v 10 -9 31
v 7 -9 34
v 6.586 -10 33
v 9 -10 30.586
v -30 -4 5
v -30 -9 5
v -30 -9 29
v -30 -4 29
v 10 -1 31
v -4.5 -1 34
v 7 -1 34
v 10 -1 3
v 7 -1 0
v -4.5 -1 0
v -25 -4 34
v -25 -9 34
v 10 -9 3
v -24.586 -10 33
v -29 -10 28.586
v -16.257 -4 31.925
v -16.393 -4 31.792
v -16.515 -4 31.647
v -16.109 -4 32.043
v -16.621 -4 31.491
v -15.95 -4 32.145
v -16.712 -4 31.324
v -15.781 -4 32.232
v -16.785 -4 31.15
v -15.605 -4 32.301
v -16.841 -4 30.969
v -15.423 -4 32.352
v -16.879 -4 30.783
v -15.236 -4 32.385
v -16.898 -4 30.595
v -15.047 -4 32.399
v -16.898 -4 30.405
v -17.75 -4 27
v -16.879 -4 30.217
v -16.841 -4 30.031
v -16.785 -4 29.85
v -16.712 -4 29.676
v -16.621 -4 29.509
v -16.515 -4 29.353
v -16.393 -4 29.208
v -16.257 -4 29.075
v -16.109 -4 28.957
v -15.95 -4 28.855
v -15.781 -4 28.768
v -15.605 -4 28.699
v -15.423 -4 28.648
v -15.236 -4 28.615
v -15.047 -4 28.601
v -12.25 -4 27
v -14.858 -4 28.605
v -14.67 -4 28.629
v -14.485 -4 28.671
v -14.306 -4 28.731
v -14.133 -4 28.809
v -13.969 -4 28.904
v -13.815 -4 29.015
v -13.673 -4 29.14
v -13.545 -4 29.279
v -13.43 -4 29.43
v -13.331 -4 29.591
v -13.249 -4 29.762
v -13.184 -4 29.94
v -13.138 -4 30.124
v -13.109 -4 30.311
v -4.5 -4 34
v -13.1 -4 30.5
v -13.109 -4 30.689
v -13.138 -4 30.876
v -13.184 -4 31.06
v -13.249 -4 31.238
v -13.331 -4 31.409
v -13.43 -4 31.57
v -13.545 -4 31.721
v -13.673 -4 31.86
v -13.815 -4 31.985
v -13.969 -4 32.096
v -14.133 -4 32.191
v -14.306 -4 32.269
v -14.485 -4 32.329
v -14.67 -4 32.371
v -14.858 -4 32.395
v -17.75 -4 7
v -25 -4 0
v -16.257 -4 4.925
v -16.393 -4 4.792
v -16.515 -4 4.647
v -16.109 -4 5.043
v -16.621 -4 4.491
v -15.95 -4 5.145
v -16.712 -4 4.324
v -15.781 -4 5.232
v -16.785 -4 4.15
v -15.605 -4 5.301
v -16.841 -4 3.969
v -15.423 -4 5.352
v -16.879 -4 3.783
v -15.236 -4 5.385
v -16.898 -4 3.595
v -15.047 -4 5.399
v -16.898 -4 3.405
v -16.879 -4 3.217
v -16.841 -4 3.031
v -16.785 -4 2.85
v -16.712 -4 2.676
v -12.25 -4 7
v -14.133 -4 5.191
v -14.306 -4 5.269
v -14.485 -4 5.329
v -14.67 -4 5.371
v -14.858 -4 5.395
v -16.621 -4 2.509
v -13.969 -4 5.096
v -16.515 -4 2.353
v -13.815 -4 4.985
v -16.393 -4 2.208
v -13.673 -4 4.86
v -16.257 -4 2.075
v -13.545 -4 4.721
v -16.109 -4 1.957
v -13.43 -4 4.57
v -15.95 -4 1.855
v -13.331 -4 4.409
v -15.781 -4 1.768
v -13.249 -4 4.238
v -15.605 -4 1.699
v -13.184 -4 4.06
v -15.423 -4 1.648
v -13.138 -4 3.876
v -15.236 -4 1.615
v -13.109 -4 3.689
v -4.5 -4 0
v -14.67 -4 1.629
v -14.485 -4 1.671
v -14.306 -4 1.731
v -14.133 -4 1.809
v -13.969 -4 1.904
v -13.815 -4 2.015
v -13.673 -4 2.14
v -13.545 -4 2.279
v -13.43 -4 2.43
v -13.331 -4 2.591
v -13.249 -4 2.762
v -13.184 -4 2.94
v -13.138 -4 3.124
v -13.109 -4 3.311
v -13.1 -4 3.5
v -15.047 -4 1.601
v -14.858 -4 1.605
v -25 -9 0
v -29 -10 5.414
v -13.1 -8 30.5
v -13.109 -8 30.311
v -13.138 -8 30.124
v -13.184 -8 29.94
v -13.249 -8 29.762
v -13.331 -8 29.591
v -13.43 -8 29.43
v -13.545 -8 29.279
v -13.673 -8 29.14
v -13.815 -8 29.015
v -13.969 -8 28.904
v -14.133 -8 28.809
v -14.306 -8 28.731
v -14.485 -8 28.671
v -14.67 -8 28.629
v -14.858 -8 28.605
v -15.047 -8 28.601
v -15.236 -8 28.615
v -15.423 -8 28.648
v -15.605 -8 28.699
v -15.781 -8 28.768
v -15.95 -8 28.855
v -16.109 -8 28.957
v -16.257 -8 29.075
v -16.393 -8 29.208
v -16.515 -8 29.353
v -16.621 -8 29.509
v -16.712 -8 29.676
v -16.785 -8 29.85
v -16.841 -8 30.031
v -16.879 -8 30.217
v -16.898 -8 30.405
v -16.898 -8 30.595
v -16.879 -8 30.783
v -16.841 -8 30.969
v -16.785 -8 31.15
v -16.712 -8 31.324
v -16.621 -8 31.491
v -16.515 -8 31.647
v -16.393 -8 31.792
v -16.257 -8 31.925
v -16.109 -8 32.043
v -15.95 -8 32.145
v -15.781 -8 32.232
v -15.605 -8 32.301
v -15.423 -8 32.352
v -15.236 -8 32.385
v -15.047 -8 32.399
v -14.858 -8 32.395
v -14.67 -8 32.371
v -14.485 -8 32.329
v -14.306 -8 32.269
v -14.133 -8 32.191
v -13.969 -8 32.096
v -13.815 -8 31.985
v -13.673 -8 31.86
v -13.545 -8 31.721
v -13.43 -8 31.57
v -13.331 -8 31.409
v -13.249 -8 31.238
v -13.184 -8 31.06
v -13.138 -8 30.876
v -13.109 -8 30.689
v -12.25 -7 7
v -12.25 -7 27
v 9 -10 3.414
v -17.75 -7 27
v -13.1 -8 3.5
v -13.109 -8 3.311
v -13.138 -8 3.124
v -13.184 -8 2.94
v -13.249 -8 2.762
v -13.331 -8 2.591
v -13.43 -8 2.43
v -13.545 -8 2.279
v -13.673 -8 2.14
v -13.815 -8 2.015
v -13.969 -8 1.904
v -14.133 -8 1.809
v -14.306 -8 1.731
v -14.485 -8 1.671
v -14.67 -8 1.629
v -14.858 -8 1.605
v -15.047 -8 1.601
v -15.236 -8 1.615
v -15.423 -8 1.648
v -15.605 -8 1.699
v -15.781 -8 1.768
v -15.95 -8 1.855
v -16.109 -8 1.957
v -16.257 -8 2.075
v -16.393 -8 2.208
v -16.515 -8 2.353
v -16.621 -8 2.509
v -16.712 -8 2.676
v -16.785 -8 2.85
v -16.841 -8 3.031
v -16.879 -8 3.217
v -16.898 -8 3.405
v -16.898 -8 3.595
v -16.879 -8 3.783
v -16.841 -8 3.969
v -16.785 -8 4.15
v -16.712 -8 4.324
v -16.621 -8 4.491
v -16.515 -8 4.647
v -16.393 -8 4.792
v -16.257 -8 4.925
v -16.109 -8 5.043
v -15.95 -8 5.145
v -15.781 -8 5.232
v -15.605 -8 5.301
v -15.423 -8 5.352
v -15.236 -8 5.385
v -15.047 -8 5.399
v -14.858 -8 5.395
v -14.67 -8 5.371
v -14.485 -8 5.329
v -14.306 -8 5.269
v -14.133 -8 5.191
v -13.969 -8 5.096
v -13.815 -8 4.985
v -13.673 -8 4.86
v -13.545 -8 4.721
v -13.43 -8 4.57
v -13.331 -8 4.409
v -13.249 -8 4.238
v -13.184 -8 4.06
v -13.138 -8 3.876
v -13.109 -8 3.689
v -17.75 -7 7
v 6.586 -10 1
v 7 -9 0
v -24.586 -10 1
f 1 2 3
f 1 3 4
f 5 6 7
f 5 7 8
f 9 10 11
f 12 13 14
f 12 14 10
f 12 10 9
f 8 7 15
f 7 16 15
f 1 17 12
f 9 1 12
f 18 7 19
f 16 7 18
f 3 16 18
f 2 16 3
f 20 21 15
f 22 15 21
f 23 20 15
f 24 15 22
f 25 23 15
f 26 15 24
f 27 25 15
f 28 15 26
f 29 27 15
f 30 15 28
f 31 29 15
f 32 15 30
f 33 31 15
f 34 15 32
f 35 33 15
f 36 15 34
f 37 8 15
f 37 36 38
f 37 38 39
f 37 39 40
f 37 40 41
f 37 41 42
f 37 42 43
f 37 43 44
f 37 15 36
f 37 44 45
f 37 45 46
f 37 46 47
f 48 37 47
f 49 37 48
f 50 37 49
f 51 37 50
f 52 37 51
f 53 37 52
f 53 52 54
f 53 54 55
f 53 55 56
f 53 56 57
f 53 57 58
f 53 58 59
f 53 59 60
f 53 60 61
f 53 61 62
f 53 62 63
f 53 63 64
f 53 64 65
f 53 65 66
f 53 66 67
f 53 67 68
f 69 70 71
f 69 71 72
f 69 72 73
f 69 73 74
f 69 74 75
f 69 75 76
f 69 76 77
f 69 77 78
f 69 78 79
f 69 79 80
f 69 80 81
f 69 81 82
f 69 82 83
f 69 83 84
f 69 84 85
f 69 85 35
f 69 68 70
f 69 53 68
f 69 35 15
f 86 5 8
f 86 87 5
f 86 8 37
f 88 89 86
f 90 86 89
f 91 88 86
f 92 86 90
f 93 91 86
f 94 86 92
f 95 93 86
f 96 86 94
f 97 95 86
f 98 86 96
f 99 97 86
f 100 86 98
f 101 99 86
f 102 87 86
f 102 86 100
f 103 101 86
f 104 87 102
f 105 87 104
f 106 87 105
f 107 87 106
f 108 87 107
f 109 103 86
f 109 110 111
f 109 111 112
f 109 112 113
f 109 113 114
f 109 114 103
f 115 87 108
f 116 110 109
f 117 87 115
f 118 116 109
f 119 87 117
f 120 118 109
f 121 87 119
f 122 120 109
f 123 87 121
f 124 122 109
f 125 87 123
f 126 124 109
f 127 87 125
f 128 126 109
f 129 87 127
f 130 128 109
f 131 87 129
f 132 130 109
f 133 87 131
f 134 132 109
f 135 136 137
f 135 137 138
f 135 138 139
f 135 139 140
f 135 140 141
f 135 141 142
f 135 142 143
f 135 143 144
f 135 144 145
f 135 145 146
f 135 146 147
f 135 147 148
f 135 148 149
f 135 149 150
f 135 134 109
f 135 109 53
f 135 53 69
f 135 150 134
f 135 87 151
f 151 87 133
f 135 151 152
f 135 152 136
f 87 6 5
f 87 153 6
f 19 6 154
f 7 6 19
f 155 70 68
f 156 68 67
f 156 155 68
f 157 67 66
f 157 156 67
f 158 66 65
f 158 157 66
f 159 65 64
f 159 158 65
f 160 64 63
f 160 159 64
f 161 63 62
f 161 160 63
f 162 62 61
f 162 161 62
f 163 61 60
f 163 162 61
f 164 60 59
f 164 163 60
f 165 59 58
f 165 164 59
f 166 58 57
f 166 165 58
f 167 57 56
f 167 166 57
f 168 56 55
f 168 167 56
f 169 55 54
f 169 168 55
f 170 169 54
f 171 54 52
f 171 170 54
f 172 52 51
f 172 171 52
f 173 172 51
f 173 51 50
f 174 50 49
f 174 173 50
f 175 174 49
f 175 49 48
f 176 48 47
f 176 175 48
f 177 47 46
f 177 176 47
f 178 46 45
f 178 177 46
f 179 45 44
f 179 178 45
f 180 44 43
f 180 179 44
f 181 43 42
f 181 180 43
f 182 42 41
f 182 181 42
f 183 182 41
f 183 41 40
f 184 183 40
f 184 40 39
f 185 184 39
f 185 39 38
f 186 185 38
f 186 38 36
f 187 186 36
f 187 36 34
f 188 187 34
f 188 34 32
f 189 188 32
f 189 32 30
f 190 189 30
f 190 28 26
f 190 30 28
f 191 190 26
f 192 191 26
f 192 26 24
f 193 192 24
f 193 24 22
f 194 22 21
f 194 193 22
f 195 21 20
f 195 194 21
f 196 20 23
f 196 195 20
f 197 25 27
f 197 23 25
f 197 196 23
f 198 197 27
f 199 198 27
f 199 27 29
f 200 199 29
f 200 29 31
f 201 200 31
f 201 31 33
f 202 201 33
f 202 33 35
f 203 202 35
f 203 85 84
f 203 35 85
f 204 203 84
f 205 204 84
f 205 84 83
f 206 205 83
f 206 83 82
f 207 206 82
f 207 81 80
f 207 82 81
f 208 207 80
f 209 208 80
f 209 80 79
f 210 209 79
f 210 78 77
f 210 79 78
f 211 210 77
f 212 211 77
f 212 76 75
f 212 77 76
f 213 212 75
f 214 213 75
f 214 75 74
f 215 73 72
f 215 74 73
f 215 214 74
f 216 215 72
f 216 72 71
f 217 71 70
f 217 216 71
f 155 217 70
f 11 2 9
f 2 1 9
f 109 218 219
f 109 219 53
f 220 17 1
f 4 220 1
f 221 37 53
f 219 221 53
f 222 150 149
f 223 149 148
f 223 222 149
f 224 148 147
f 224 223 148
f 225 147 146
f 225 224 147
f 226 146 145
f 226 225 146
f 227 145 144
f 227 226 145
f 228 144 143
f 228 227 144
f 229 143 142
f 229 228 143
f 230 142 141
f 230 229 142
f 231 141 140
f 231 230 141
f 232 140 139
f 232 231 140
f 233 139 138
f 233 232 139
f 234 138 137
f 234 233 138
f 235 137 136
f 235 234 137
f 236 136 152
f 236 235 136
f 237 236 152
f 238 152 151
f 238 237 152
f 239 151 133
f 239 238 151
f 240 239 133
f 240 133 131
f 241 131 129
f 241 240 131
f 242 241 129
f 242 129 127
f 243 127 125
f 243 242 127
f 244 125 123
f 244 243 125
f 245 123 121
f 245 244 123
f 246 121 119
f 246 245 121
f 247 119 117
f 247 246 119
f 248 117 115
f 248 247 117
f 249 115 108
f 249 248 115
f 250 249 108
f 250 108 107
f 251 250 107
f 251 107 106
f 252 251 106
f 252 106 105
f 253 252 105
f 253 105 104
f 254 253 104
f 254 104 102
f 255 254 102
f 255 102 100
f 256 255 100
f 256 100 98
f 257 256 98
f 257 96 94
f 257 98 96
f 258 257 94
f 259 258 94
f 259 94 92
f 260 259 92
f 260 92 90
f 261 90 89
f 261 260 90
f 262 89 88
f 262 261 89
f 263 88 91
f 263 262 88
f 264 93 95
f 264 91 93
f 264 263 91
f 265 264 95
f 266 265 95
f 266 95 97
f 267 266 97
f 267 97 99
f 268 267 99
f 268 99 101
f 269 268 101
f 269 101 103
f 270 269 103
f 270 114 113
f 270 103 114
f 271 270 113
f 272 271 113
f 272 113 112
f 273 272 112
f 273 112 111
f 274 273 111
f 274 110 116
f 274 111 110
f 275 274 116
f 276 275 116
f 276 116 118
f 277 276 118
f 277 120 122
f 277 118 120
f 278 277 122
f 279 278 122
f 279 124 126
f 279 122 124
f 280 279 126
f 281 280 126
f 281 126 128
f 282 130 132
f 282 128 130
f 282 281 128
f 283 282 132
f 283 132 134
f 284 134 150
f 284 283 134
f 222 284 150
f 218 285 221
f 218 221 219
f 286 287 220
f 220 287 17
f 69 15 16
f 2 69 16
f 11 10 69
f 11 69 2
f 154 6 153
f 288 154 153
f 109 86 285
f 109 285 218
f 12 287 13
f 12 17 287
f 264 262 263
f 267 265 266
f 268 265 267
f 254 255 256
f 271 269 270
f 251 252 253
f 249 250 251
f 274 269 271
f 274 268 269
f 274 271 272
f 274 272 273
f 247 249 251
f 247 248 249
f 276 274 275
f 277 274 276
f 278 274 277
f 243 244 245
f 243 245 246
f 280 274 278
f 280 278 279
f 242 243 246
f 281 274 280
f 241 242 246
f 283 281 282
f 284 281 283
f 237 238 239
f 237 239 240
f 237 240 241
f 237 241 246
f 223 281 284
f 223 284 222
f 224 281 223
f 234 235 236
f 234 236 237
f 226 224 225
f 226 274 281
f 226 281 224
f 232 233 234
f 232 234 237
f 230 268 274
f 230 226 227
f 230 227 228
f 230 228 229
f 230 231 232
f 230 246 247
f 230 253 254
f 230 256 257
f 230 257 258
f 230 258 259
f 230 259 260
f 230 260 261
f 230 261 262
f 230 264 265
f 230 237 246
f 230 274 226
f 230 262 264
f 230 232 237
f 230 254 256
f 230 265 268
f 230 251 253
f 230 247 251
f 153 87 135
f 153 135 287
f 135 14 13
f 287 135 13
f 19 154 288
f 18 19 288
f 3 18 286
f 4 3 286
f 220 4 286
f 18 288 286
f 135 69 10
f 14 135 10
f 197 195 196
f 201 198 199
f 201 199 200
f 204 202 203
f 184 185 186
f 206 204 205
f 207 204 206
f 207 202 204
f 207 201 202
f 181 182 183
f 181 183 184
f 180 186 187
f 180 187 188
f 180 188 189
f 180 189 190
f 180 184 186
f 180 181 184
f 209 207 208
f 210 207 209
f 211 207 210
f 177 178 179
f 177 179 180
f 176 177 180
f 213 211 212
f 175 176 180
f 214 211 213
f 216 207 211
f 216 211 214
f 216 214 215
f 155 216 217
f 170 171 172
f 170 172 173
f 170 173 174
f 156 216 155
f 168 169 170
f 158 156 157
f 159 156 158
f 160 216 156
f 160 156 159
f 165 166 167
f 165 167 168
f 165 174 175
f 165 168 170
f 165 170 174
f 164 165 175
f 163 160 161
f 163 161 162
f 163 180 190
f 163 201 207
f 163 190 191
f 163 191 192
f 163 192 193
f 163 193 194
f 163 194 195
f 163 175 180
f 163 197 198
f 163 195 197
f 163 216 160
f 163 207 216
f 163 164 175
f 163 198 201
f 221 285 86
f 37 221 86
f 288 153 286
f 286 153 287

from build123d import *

# Parameters (mm, degrees)
CYLINDER016013_R                  = 1.9
CYLINDER016013_DEPTH              = 10
CYLINDER016014_R                  = 1.9
CYLINDER016014_DEPTH              = 10
BOX018_W                          = 5.5
BOX018_H                          = 3
BOX018_DEPTH                      = 20
BOX016_W                          = 25.5
BOX016_H                          = 3
BOX016_DEPTH                      = 34
BOX017_W                          = 40
BOX017_H                          = 9
BOX017_DEPTH                      = 34
CHAMFER016016008004017002011_SIZE = 5
CHAMFER016016008004017002012_SIZE = 3
CHAMFER016016008004017002013_SIZE = 1


with BuildPart() as cylinder029:
    # Cylinder016013 → Cylinder016013 (new body)
    with BuildSketch(Plane(origin=(-15, 0, 3.5), x_dir=(1, 0, 0), z_dir=(0, 1, 0))):
        Circle(CYLINDER016013_R)
    extrude(amount=CYLINDER016013_DEPTH)


with BuildPart() as fusion018002:
    # Cylinder016014 → Cylinder016014 (new body)
    with BuildSketch(Plane(origin=(-15, 0, 30.5), x_dir=(1, 0, 0), z_dir=(0, 1, 0))):
        Circle(CYLINDER016014_R)
    extrude(amount=CYLINDER016014_DEPTH)

    # Fusion018002: union Cylinder029
    add(cylinder029.part)


with BuildPart() as fusion018002_1:
    # Fusion018002 placement: moved
    add(fusion018002.part.moved(Location((0, -8, 0))))


with BuildPart() as cube018:
    # Box018 → Box018 (new body)
    with BuildSketch(Plane(origin=(-17.75, -7, 7), x_dir=(1, 0, 0), z_dir=(0, 0, 1))):
        with Locations((2.75, 1.5)):
            Rectangle(BOX018_W, BOX018_H)
    extrude(amount=BOX018_DEPTH)


with BuildPart() as cube016:
    # Box016 → Box016 (new body)
    with BuildSketch(Plane(origin=(-30, -4, 0), x_dir=(1, 0, 0), z_dir=(0, 0, 1))):
        with Locations((12.75, 1.5)):
            Rectangle(BOX016_W, BOX016_H)
    extrude(amount=BOX016_DEPTH)


with BuildPart() as door_hanlde_sm_mag:
    # Box017 → Box017 (new body)
    with BuildSketch(Plane(origin=(-30, -10, 0), x_dir=(1, 0, 0), z_dir=(0, 0, 1))):
        with Locations((20, 4.5)):
            Rectangle(BOX017_W, BOX017_H)
    extrude(amount=BOX017_DEPTH)

    # Cut010011008003: cut Cube016
    add(cube016.part, mode=Mode.SUBTRACT)

    # Cut010011008009003016015: cut Cube018
    add(cube018.part, mode=Mode.SUBTRACT)

    # Cut010011008009003016016: cut Fusion018002
    add(fusion018002_1.part, mode=Mode.SUBTRACT)

    # Chamfer016016008004017002011
    chamfer016016008004017002011_edges = [door_hanlde_sm_mag.edges().sort_by_distance(p)[0] for p in [
        (-30, -7, 34),
        (-30, -7, 0),
    ]]
    chamfer(chamfer016016008004017002011_edges, length=CHAMFER016016008004017002011_SIZE)

    # Chamfer016016008004017002012
    chamfer016016008004017002012_edges = [door_hanlde_sm_mag.edges().sort_by_distance(p)[0] for p in [
        (10, -5.5, 0),
        (10, -5.5, 34),
    ]]
    chamfer(chamfer016016008004017002012_edges, length=CHAMFER016016008004017002012_SIZE)

    # Chamfer016016008004017002013
    chamfer016016008004017002013_edges = [door_hanlde_sm_mag.edges().sort_by_distance(p)[0] for p in [
        (-9, -10, 0),
        (-27.5, -10, 2.5),
        (-30, -10, 17),
        (-27.5, -10, 31.5),
        (-9, -10, 34),
        (8.5, -10, 32.5),
        (10, -10, 17),
        (8.5, -10, 1.5),
    ]]
    chamfer(chamfer016016008004017002013_edges, length=CHAMFER016016008004017002013_SIZE)


solid = door_hanlde_sm_mag.part
